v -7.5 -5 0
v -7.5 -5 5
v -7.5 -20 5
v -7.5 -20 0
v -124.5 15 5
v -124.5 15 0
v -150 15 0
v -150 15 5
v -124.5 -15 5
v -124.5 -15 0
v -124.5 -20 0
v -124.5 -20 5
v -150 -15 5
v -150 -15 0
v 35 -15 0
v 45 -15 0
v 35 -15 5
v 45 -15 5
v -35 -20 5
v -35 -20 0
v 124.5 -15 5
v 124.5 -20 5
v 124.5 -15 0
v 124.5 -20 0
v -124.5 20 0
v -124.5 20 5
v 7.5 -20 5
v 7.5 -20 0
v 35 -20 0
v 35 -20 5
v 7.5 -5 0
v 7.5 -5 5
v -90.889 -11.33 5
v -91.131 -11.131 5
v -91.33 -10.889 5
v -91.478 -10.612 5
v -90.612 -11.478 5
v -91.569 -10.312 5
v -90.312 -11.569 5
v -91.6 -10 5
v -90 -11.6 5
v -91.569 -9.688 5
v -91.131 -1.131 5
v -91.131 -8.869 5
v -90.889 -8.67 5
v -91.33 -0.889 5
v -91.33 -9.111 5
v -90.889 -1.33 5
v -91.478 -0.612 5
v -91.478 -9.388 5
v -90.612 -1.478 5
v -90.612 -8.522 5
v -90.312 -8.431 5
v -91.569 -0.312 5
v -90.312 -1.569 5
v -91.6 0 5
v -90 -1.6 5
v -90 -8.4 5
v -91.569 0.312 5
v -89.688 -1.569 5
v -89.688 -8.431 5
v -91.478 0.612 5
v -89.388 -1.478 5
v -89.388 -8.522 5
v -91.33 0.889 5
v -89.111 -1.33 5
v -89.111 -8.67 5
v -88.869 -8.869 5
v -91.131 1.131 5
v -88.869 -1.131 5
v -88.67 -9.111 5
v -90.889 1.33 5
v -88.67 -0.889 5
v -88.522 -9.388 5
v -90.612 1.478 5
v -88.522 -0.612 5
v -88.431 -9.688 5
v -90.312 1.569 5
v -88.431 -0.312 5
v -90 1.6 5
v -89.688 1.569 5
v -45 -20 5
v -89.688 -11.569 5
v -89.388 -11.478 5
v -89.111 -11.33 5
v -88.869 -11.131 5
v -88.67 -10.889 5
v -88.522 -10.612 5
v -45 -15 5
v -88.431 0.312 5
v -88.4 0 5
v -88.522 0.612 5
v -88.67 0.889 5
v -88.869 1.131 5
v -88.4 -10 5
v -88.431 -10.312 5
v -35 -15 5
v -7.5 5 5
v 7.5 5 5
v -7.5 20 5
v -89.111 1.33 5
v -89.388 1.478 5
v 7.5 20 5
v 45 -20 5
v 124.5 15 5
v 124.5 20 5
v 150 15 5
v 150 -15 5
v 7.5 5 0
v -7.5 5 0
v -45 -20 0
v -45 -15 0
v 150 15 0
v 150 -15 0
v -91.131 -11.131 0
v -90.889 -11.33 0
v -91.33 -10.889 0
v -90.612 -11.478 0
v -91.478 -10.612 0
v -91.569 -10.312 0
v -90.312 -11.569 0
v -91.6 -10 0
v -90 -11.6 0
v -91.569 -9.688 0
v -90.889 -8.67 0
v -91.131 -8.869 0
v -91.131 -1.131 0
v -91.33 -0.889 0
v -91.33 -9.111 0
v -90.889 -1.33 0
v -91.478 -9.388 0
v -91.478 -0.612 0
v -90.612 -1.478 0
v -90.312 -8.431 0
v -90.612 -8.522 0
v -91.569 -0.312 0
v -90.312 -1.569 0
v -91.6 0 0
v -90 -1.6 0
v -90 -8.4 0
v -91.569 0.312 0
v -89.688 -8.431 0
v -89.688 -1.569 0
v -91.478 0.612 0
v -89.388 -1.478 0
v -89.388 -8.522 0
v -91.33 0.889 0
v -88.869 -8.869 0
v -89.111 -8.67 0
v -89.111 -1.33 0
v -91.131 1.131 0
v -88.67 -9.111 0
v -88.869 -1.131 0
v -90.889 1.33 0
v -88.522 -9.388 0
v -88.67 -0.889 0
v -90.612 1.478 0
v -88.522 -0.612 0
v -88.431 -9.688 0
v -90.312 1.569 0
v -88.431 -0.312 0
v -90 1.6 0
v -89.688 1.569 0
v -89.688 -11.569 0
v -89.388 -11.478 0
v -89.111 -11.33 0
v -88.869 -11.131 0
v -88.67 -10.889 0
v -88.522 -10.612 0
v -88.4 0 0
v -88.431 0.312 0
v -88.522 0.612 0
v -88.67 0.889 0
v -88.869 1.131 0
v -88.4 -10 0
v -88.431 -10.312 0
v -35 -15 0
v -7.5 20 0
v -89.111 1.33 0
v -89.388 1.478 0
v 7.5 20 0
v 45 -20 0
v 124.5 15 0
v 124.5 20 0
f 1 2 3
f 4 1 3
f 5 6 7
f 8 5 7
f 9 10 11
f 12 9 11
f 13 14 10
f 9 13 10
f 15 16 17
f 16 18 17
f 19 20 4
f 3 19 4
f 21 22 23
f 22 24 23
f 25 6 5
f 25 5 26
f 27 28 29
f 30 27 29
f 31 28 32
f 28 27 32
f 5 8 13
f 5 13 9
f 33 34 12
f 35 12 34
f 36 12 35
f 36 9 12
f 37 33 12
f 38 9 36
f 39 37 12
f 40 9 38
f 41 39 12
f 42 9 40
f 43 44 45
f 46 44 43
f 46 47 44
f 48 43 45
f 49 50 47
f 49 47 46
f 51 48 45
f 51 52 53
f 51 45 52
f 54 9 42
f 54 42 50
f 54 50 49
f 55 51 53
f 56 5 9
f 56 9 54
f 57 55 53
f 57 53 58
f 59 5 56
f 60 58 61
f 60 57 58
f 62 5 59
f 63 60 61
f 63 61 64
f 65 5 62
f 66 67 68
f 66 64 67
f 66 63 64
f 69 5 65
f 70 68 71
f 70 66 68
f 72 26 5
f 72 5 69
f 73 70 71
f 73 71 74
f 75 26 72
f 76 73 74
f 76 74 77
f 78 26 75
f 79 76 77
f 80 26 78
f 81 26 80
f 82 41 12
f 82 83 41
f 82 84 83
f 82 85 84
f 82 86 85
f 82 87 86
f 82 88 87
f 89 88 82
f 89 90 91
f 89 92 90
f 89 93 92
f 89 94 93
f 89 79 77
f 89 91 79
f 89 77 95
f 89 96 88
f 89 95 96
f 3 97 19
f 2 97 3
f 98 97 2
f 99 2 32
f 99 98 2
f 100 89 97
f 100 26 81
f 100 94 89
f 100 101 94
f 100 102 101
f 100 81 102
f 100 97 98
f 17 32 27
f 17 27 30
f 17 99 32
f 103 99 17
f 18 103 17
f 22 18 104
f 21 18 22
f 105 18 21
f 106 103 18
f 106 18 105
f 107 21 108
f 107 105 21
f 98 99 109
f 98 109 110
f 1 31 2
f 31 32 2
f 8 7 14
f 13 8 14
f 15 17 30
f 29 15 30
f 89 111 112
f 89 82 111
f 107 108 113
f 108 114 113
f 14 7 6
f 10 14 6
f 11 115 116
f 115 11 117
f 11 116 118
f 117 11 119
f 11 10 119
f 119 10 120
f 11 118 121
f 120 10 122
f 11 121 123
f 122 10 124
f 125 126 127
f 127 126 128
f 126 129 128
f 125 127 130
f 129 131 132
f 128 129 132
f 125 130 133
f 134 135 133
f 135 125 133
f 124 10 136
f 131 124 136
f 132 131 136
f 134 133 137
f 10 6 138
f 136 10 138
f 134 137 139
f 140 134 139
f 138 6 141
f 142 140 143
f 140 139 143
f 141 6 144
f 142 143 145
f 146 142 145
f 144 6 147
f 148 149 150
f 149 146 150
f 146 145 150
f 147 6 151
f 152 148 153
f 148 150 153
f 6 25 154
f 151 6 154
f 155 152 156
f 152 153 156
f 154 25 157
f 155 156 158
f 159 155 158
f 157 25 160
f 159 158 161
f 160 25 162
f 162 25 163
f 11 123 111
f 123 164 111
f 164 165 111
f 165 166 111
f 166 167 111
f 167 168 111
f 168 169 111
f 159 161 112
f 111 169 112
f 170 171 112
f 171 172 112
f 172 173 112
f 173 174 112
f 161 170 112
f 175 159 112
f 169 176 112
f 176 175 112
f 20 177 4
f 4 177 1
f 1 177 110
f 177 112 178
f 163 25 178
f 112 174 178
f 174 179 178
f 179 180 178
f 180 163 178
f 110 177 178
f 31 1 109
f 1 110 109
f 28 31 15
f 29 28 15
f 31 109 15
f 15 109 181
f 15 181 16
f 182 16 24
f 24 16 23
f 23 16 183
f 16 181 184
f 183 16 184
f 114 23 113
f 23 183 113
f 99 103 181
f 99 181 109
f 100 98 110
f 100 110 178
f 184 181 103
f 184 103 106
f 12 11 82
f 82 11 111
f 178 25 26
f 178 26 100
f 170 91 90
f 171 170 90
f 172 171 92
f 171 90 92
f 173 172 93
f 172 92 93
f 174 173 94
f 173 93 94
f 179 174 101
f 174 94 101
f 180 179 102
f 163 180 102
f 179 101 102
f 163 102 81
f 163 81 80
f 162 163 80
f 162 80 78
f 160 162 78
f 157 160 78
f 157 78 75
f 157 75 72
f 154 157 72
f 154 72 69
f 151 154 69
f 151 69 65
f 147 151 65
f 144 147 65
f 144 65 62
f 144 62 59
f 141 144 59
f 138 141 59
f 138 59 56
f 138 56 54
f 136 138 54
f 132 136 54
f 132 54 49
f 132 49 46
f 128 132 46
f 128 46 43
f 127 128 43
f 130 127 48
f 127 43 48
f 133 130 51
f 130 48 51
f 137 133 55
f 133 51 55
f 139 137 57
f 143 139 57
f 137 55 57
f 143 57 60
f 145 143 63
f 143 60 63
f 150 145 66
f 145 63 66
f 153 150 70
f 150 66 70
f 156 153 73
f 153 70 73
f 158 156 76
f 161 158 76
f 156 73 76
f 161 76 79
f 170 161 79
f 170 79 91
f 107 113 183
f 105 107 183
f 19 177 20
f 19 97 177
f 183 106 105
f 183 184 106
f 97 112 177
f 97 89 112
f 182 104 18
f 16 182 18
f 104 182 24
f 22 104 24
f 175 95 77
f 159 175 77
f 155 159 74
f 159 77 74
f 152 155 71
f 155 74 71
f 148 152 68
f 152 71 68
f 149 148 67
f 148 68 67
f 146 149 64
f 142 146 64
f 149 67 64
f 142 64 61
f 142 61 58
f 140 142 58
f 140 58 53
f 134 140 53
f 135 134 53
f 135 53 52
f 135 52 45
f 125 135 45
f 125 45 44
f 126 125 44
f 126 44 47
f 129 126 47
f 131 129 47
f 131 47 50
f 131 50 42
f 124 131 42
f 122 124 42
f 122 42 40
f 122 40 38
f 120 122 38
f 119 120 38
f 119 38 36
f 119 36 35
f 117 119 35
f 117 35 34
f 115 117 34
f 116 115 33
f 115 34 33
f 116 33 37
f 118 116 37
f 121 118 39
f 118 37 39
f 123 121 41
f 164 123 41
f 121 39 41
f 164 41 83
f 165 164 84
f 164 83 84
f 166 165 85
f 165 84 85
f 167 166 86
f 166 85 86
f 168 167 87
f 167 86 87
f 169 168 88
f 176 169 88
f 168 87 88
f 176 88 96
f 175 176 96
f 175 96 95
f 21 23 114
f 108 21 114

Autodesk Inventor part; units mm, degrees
ref_plane "YZ Plane" through (0, 0, 0) normal (1, 0, 0) x (0, 1, 0)
ref_plane "XZ Plane" through (0, 0, 0) normal (0, 1, 0) x (-1, 0, 0)
ref_plane "XY Plane" through (0, 0, 0) normal (0, 0, 1) x (1, 0, 0)
sketch "Sketch1" plane through (0, 0, 0) normal (0, 0, 1) x (1, 0, 0)
  line L0 (-150, -15) -> (150, -15)
  line L1 (150, -15) -> (150, 15)
  line L2 (150, 15) -> (-150, 15)
  line L3 (-150, 15) -> (-150, -15)
  line L4 (-150, -15) -> (150, 15) construction
  line L5 (150, -15) -> (-150, 15) construction
  line L6 (-124.5, 20) -> (124.5, 20)
  line L7 (124.5, 20) -> (124.5, 15)
  line L8 (124.5, 15) -> (-124.5, 15)
  line L9 (-124.5, 15) -> (-124.5, 20)
  line L10 (-124.5, 20) -> (124.5, 15) construction
  line L11 (124.5, 20) -> (-124.5, 15) construction
  line L12 (-150, 0) -> (150, 0)
  line L13 (-124.5, -20) -> (124.5, -20)
  line L14 (124.5, -20) -> (124.5, -15)
  line L15 (124.5, -15) -> (-124.5, -15)
  line L16 (-124.5, -15) -> (-124.5, -20)
  line L17 (-124.5, -20) -> (124.5, -15) construction
  line L18 (124.5, -20) -> (-124.5, -15) construction
  point P0 (0, 0)
  point P1 (0, 0)
  point P2 (0, 17.5)
  point P3 (0, 15)
  point P4 (-77.3047, 14.0744)
  point P5 (81.6953, 14.0744)
  point P6 (0, -15)
  point P7 (0, -17.5)
  dimension "d0" = 5
  dimension "d1" = 30
  dimension "d2" = 300
  dimension "d3" = 249
extrude "Plate1" add sketch "Sketch1" along normal blind 5
sketch "Sketch3" plane through (0, 0, 5) normal (0, 0, 1) x (1, 0, 0)
  line L0 (-124.5, -20) -> (124.5, -20) projected
  line L1 (-7.5, -20) -> (7.5, -20)
  line L2 (7.5, -20) -> (7.5, -5)
  line L3 (7.5, -5) -> (-7.5, -5)
  line L4 (-7.5, -5) -> (-7.5, -20)
  point P0 (0, -5)
  point P1 (0, 0)
  dimension "d19" = 15
extrude "Cut1" cut sketch "Sketch3" against normal blind 5
sketch "Sketch4" plane through (0, 0, 5) normal (0, 0, 1) x (1, 0, 0)
  circle A0 centre (-90, 0) radius 1.6
  circle A1 centre (-90, -10) radius 1.6
  line L0 (-7.5, -5) -> (7.5, -5) projected
  point P0 (0, 0)
  point P1 (0, -5)
  dimension "d9" = 3.2
  dimension "d10" = 3.2
  dimension "d12" = 10
  dimension "d21" = 90
extrude "Cut2" cut sketch "Sketch4" against normal blind 5
sketch "Sketch5" plane through (0, 0, 5) normal (0, 0, 1) x (1, 0, 0)
  line L0 (-124.5, 20) -> (124.5, 20) projected
  line L1 (-7.5, 20) -> (7.5, 20)
  line L2 (7.5, 20) -> (7.5, 5)
  line L3 (7.5, 5) -> (-7.5, 5)
  line L4 (-7.5, 5) -> (-7.5, 20)
  line L5 (0, 20) -> (0, 0)
  dimension "d15" = 15
extrude "Cut3" cut sketch "Sketch5" against normal blind 5
sketch "Sketch6" plane through (0, 0, 5) normal (0, 0, 1) x (1, 0, 0)
  line L0 (124.5, -20) -> (7.5, -20) projected
  line L1 (35, -20) -> (45, -20)
  line L2 (45, -20) -> (45, -15)
  line L3 (45, -15) -> (35, -15)
  line L4 (35, -15) -> (35, -20)
  line L5 (7.5, 5) -> (-7.5, 5) projected
  line L6 (0, 5) -> (0, -4.2095)
  line L7 (-35, -20) -> (-45, -20)
  line L8 (-45, -20) -> (-45, -15)
  line L9 (-45, -15) -> (-35, -15)
  line L10 (-35, -15) -> (-35, -20)
  point P0 (0, 0)
  dimension "d22" = 5
  dimension "d23" = 10
  dimension "d24" = 35
extrude "Cut4" cut sketch "Sketch6" against normal blind 5
equation "\"d7\" = Thickness"
equation "\"d13\" = Thickness"
equation "\"d16\" = Thickness"
equation "\"d25\" = Thickness"
equation "\"d4\" = Thickness"
equation "\"BendRadius\" = Thickness"
equation "\"BendReliefWidth\" = Thickness"
equation "\"BendReliefDepth\" = 0.5 * Thickness"
equation "\"TransitionRadius\" = BendRadius"
equation "\"JacobiRadiusSize\" = BendRadius"
equation "\"GapSize\" = Thickness"
equation "\"Thickness\" = 5"
properties part number "Base Leg V2 Slotted"
